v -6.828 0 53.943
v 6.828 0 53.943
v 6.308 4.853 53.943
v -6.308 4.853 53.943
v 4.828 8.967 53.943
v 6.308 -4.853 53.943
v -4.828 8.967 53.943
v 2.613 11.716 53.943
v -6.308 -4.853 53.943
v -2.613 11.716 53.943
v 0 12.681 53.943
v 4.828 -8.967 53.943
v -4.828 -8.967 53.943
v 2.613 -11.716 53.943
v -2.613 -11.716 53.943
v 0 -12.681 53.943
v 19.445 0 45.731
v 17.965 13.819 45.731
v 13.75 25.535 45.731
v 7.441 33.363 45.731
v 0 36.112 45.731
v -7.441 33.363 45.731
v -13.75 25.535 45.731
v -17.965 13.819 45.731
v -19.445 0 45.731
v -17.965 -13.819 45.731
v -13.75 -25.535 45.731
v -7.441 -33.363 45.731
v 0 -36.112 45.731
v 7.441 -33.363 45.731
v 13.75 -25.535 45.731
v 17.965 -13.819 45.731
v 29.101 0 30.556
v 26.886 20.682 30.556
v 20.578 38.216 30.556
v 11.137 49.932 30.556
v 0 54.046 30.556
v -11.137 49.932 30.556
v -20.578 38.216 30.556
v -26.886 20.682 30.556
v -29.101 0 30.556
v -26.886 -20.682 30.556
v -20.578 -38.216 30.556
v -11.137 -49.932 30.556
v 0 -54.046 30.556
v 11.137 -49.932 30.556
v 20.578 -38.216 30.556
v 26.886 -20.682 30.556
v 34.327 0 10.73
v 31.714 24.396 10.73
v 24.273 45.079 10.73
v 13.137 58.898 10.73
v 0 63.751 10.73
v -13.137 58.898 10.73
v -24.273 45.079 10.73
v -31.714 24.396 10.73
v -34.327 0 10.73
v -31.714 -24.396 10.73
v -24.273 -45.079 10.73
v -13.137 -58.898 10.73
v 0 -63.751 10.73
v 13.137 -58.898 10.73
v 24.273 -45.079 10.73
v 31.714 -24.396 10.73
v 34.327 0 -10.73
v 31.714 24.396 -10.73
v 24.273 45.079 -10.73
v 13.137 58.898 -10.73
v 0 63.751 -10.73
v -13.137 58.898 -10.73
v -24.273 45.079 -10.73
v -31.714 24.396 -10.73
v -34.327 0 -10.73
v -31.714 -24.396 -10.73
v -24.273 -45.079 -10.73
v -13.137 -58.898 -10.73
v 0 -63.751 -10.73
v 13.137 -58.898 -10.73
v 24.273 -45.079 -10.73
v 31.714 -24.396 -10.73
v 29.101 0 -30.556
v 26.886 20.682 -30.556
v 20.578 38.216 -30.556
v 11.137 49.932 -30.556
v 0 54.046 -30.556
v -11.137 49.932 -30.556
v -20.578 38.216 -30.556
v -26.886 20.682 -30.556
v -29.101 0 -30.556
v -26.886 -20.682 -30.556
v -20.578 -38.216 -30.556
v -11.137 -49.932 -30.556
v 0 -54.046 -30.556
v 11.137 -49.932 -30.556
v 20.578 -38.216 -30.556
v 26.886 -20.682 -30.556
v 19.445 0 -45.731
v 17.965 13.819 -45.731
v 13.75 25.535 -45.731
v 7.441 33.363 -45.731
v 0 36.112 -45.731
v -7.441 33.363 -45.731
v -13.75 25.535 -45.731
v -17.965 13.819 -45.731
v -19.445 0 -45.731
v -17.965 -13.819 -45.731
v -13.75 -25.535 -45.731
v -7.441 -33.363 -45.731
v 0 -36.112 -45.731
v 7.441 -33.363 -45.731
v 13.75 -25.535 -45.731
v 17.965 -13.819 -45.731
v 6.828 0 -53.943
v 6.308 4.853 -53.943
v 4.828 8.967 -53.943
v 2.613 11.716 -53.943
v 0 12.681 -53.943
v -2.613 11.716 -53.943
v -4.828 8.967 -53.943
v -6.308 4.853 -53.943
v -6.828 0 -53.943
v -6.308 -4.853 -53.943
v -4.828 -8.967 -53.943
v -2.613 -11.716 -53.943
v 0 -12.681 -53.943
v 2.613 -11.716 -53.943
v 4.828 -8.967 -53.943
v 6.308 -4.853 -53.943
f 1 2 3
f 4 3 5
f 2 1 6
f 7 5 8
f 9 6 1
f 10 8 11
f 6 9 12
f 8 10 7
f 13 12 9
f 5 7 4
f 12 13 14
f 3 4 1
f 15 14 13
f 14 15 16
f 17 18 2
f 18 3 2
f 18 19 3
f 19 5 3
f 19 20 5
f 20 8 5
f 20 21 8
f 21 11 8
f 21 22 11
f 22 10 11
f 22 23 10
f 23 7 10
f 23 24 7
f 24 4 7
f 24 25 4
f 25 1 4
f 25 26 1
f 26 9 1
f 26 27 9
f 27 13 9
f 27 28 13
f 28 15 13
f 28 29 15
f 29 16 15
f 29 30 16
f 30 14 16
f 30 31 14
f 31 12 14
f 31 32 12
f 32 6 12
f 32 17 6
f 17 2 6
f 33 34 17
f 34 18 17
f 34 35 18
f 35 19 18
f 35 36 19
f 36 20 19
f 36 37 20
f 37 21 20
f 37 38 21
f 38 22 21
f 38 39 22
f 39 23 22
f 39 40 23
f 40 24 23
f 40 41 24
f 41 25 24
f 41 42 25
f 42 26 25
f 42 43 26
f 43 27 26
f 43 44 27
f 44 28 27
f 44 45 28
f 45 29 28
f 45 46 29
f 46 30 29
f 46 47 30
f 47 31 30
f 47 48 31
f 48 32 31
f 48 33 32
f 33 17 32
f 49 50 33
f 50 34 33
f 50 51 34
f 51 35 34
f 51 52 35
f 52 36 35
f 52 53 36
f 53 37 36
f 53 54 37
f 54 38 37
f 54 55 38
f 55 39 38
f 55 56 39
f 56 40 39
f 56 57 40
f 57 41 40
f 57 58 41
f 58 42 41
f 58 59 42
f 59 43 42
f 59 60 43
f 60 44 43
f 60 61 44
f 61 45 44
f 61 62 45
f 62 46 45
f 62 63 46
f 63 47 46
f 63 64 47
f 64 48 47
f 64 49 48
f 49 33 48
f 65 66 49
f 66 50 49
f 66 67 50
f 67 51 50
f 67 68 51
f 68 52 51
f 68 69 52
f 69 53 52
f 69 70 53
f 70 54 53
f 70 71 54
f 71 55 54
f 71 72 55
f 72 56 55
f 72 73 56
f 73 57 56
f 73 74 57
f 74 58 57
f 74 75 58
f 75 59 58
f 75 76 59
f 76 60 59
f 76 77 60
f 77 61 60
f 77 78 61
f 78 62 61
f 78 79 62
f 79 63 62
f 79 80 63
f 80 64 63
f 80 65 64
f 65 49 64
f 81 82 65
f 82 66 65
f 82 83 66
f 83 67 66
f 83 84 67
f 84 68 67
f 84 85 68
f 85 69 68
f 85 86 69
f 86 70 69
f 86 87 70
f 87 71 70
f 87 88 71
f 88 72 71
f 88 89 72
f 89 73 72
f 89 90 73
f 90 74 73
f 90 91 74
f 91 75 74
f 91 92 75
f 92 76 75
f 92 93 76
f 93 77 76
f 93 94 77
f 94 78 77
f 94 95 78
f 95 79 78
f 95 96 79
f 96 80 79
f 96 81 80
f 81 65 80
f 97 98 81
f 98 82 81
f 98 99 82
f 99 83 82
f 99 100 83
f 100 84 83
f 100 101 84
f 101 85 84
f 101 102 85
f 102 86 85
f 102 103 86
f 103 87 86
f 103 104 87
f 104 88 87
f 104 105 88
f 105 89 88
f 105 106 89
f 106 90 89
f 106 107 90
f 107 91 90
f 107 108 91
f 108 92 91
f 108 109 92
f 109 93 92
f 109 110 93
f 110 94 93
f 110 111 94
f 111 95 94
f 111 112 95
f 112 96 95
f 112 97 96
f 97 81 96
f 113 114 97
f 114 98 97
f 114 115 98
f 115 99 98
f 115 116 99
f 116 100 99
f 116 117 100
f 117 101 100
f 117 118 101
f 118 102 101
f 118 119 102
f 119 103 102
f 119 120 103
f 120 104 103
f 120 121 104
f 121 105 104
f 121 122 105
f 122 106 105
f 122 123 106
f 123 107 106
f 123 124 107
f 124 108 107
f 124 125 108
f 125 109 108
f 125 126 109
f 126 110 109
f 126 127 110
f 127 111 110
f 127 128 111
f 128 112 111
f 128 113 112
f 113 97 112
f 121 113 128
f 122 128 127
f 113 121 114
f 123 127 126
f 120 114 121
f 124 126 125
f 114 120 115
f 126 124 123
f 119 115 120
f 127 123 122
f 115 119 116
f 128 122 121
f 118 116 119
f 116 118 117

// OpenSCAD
// Generated by SolidPython 1.0.1 on 2020-07-29 00:46:47


scale(v = [7, 13, 11]) {
	sphere(r = 5);
}
/***********************************************
*********      SolidPython code:      **********
************************************************
 
# import packages: SolidPython
from solid import *
from solid.utils import *
from itertools import chain, combinations, permutations


class Resize:

    def __init__(self, scad_file):
        self.scad_file = scad_file
        #self.scad_file = import_scad(scad_file)
        # cone/cylinder param:
        self.r1 = 0
        self.r2 = 0
        self.h = 0
        # rectangular prism param:
        self.w = 0
        self.l = 0
        # ellipse param:
        self.r = 0

    # import OpenScad code (file name corresponds to shape)


    # classify shape + parameters
    def assign(self, param1, param2, param3):
        if self.scad_file == 'cone.scad':
            self.r1 = param1
            self.r2 = param2
            self.h = param3
        elif self.scad_file == 'cylinder.scad':
            self.r1 = param1
            self.r2 = param2
            self.h = param3
        elif self.scad_file == 'rectangularPrism.scad':
            self.h = param1
            self.l = param2
            self.w = param3
        else:
            self.r = param1
            self.h = param2

    # resize parameters
    def iterate(self):
        x = range(3, 20, 2)
        i = 1
        if self.scad_file == 'cone.scad':
            tempList = list(permutations(x, 2))
            for temp in tempList:
                param1 = temp[0]
                param2 = temp[1]
                filepath = 'produced_scad_files/' + 'cone' + str(param1) + '_' + str(param2) + '_' + '.scad'
                scad_render_to_file(cylinder(h=param1, r1=param2, r2=0), filepath)

        elif self.scad_file == 'cylinder.scad':
            tempList = list(permutations(x, 3))
            for temp in tempList:
                param1 = temp[0]
                param2 = temp[1]
                filepath = 'produced_scad_files/' + 'cylinder' + str(param1) + '_' + str(param2) + '_' + '.scad'
                scad_render_to_file(cylinder(h=param1, r1=param2, r2=param2), filepath)

        elif self.scad_file == 'rectangularPrism.scad':
            tempList = list(permutations(x, 3))
            for temp in tempList:
                param1 = temp[0]
                param2 = temp[1]
                param3 = temp[2]
                filepath = 'produced_scad_files/' + 'rectangularPrism' + str(param1) + '_' + str(param2) + '_' + str(
                    param3) + '.scad'
                scad_render_to_file(cube(size=(param1, param2, param3)), filepath)

        elif self.scad_file == 'ellipse.scad':
            tempList = list(permutations(x, 4))
            for temp in tempList:
                param1 = temp[0]
                param2 = temp[1]
                param3 = temp[2]
                param4 = temp[3]
                filepath = 'produced_scad_files/' + 'ellipse' + str(param1) + '_' + str(param2) + '_' + str(param3) + '_' + str(param4) + '.scad'
                scad_render_to_file(scale([param1, param2, param3])(sphere(r=param4)), filepath)

    def render_to_scadfile(self):
        scad_render_to_file(scad, 'example.scad') 
 
************************************************/
